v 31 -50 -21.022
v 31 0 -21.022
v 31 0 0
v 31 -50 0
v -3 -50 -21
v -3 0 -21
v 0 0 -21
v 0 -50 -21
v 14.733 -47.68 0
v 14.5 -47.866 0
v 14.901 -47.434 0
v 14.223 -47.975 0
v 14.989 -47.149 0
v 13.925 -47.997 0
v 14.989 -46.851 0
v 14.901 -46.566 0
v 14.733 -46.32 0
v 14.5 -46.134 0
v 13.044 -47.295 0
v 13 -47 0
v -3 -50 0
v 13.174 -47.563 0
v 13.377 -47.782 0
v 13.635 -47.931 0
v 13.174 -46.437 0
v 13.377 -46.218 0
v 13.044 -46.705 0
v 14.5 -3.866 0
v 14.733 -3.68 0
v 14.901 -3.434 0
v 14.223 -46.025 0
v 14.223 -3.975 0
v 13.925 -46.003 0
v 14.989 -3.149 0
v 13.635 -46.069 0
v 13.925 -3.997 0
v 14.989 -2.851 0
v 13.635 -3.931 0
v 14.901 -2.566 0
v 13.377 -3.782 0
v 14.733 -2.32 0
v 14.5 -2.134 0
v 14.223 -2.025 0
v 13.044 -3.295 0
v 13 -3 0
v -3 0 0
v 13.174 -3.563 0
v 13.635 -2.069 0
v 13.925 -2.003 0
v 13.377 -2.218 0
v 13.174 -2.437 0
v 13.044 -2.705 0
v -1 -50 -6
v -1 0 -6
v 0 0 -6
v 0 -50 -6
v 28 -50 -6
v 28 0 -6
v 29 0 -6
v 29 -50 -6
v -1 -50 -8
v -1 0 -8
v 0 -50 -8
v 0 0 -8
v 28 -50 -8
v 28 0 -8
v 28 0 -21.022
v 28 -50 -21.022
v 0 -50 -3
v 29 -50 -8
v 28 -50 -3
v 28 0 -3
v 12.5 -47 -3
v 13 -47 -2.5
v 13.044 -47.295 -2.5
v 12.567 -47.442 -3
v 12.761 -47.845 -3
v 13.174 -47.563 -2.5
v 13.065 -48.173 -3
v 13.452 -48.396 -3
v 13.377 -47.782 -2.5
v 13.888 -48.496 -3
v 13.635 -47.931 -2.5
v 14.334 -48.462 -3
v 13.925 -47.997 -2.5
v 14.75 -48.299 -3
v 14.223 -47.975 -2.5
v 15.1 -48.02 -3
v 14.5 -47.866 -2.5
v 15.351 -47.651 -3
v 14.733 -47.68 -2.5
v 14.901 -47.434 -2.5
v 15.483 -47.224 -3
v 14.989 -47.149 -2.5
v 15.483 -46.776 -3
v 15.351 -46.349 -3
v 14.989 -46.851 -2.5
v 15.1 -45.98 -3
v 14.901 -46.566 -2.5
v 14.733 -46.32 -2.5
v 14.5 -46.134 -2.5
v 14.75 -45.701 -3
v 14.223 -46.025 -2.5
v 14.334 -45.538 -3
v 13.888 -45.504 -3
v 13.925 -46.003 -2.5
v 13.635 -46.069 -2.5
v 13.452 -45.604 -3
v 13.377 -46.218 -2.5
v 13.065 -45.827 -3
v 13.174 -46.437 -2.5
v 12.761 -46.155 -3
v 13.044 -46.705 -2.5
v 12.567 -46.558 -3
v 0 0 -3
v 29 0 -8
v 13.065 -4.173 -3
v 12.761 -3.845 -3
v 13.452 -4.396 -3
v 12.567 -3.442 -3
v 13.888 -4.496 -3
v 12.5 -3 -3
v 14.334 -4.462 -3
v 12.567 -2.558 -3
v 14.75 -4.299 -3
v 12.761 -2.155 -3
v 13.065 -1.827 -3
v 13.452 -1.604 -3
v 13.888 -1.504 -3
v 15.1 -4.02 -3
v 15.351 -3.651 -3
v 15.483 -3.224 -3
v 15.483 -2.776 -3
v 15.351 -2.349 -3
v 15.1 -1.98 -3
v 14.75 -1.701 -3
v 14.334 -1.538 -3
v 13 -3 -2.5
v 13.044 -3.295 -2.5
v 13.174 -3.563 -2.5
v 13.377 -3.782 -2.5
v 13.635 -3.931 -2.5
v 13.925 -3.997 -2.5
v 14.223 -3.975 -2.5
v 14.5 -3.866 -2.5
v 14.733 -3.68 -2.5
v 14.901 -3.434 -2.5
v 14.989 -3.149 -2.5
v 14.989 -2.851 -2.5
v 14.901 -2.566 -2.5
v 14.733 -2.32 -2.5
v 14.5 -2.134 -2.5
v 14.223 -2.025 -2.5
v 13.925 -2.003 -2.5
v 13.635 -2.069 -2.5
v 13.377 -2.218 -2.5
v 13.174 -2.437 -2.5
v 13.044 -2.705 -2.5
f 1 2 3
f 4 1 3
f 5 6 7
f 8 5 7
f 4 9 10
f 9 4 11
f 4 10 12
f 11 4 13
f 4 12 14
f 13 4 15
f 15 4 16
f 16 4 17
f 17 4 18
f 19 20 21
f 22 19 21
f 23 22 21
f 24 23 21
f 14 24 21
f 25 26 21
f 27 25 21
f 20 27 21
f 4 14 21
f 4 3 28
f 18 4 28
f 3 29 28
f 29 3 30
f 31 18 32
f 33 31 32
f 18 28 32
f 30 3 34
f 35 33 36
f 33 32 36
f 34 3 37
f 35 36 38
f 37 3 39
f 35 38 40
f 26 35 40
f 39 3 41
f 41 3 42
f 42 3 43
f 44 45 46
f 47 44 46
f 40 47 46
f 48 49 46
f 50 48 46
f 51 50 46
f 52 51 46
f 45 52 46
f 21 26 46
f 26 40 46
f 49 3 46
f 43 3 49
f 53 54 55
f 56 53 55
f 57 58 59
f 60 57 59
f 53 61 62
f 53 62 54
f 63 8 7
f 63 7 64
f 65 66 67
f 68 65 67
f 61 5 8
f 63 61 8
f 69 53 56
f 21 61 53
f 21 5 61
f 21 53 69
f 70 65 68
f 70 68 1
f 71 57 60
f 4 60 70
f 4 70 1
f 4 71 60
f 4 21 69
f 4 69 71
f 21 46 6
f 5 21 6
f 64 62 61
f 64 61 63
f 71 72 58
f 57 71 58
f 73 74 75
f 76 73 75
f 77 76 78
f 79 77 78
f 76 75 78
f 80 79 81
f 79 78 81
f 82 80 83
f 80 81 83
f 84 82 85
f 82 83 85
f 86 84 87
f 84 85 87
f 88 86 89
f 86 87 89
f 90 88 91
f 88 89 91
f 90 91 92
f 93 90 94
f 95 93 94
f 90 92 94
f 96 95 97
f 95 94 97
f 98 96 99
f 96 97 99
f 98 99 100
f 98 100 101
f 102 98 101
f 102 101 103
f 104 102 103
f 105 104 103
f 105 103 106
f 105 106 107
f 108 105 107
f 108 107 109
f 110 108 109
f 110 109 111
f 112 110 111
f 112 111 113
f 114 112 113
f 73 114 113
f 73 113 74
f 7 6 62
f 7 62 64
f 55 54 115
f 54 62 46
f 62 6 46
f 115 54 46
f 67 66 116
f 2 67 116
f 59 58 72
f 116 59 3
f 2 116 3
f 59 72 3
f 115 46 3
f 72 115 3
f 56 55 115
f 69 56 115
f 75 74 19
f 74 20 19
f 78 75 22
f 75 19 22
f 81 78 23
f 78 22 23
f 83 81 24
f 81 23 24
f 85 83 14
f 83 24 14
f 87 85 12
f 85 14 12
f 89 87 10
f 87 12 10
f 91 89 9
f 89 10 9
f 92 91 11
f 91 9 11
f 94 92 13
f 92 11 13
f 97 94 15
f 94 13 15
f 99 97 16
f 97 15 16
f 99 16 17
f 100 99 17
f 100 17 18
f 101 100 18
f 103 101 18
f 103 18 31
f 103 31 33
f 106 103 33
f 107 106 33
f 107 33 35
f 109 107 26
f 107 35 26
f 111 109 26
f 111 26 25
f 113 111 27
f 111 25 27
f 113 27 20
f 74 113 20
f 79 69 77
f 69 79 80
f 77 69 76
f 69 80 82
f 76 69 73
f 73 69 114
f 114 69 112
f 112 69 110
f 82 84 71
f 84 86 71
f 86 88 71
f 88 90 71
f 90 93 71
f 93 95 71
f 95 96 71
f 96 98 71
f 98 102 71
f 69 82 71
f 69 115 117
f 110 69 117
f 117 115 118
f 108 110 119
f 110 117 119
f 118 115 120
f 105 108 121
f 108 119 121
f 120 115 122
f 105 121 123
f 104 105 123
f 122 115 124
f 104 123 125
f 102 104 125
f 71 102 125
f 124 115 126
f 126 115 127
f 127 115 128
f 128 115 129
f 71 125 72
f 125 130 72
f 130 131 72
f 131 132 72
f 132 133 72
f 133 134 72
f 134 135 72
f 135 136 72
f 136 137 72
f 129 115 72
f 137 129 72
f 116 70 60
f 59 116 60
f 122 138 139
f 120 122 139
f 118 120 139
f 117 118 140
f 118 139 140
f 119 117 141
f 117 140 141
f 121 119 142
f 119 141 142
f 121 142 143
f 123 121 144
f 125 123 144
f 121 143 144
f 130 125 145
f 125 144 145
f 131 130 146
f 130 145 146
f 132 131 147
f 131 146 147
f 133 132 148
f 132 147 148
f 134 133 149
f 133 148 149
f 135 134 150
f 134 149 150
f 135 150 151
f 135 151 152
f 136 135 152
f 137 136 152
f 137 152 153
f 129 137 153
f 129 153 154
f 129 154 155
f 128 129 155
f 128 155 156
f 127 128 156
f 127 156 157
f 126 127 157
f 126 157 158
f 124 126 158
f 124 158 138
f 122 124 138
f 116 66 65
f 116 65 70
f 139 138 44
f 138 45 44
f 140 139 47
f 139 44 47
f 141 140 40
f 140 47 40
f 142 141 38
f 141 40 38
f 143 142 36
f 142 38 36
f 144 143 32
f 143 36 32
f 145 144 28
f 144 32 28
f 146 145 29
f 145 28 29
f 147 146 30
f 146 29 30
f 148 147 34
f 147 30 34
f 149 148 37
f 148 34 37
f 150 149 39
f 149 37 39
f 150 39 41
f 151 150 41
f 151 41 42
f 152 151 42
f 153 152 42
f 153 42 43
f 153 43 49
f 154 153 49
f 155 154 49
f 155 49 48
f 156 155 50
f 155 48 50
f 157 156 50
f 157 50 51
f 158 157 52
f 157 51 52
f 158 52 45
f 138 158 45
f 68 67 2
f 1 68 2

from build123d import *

# Parameters (mm, degrees)
F0_W           = 28
F0_H           = 3
F1_DEPTH       = 50
F2_W           = 1
F2_H           = 2
F3_DEPTH       = 50
F5_D           = 2
F5_CSINK_D     = 3
F5_CSINK_ANGLE = 90
F6_D           = 2
F6_CSINK_D     = 3
F6_CSINK_ANGLE = 90


with BuildPart() as f1:
    # F0 (on Front) → F1 (new body)
    with BuildSketch(Plane.XZ):
        Polygon((0, -3), (0, 0), (-3, 0), (-3, -21), (0, -21), align=None)
        with Locations((14, -1.5)):
            Rectangle(F0_W, F0_H)
        Polygon((31, 0), (28, 0), (28, -3), (28, -21.022089), (31, -21.022089), align=None)
    extrude(amount=F1_DEPTH)

    # F2 (on face) → F3 (cut)
    with BuildSketch(Plane.XZ.offset(50)):
        with Locations((-0.5, -7)):
            Rectangle(F2_W, F2_H)
        with Locations((28.5, -7)):
            Rectangle(F2_W, F2_H)
    extrude(amount=-F3_DEPTH, mode=Mode.SUBTRACT)

    # F5 (through all)
    with Locations(Plane(origin=(0, 0, -3), x_dir=(1, 0, 0), z_dir=(0, 0, -1))):
        with Locations((14, 47)):
            CounterSinkHole(F5_D / 2, F5_CSINK_D / 2, counter_sink_angle=F5_CSINK_ANGLE)

    # F6 (through all)
    with Locations(Plane(origin=(0, 0, -3), x_dir=(1, 0, 0), z_dir=(0, 0, -1))):
        with Locations((14, 3)):
            CounterSinkHole(F6_D / 2, F6_CSINK_D / 2, counter_sink_angle=F6_CSINK_ANGLE)


solid = f1.part
